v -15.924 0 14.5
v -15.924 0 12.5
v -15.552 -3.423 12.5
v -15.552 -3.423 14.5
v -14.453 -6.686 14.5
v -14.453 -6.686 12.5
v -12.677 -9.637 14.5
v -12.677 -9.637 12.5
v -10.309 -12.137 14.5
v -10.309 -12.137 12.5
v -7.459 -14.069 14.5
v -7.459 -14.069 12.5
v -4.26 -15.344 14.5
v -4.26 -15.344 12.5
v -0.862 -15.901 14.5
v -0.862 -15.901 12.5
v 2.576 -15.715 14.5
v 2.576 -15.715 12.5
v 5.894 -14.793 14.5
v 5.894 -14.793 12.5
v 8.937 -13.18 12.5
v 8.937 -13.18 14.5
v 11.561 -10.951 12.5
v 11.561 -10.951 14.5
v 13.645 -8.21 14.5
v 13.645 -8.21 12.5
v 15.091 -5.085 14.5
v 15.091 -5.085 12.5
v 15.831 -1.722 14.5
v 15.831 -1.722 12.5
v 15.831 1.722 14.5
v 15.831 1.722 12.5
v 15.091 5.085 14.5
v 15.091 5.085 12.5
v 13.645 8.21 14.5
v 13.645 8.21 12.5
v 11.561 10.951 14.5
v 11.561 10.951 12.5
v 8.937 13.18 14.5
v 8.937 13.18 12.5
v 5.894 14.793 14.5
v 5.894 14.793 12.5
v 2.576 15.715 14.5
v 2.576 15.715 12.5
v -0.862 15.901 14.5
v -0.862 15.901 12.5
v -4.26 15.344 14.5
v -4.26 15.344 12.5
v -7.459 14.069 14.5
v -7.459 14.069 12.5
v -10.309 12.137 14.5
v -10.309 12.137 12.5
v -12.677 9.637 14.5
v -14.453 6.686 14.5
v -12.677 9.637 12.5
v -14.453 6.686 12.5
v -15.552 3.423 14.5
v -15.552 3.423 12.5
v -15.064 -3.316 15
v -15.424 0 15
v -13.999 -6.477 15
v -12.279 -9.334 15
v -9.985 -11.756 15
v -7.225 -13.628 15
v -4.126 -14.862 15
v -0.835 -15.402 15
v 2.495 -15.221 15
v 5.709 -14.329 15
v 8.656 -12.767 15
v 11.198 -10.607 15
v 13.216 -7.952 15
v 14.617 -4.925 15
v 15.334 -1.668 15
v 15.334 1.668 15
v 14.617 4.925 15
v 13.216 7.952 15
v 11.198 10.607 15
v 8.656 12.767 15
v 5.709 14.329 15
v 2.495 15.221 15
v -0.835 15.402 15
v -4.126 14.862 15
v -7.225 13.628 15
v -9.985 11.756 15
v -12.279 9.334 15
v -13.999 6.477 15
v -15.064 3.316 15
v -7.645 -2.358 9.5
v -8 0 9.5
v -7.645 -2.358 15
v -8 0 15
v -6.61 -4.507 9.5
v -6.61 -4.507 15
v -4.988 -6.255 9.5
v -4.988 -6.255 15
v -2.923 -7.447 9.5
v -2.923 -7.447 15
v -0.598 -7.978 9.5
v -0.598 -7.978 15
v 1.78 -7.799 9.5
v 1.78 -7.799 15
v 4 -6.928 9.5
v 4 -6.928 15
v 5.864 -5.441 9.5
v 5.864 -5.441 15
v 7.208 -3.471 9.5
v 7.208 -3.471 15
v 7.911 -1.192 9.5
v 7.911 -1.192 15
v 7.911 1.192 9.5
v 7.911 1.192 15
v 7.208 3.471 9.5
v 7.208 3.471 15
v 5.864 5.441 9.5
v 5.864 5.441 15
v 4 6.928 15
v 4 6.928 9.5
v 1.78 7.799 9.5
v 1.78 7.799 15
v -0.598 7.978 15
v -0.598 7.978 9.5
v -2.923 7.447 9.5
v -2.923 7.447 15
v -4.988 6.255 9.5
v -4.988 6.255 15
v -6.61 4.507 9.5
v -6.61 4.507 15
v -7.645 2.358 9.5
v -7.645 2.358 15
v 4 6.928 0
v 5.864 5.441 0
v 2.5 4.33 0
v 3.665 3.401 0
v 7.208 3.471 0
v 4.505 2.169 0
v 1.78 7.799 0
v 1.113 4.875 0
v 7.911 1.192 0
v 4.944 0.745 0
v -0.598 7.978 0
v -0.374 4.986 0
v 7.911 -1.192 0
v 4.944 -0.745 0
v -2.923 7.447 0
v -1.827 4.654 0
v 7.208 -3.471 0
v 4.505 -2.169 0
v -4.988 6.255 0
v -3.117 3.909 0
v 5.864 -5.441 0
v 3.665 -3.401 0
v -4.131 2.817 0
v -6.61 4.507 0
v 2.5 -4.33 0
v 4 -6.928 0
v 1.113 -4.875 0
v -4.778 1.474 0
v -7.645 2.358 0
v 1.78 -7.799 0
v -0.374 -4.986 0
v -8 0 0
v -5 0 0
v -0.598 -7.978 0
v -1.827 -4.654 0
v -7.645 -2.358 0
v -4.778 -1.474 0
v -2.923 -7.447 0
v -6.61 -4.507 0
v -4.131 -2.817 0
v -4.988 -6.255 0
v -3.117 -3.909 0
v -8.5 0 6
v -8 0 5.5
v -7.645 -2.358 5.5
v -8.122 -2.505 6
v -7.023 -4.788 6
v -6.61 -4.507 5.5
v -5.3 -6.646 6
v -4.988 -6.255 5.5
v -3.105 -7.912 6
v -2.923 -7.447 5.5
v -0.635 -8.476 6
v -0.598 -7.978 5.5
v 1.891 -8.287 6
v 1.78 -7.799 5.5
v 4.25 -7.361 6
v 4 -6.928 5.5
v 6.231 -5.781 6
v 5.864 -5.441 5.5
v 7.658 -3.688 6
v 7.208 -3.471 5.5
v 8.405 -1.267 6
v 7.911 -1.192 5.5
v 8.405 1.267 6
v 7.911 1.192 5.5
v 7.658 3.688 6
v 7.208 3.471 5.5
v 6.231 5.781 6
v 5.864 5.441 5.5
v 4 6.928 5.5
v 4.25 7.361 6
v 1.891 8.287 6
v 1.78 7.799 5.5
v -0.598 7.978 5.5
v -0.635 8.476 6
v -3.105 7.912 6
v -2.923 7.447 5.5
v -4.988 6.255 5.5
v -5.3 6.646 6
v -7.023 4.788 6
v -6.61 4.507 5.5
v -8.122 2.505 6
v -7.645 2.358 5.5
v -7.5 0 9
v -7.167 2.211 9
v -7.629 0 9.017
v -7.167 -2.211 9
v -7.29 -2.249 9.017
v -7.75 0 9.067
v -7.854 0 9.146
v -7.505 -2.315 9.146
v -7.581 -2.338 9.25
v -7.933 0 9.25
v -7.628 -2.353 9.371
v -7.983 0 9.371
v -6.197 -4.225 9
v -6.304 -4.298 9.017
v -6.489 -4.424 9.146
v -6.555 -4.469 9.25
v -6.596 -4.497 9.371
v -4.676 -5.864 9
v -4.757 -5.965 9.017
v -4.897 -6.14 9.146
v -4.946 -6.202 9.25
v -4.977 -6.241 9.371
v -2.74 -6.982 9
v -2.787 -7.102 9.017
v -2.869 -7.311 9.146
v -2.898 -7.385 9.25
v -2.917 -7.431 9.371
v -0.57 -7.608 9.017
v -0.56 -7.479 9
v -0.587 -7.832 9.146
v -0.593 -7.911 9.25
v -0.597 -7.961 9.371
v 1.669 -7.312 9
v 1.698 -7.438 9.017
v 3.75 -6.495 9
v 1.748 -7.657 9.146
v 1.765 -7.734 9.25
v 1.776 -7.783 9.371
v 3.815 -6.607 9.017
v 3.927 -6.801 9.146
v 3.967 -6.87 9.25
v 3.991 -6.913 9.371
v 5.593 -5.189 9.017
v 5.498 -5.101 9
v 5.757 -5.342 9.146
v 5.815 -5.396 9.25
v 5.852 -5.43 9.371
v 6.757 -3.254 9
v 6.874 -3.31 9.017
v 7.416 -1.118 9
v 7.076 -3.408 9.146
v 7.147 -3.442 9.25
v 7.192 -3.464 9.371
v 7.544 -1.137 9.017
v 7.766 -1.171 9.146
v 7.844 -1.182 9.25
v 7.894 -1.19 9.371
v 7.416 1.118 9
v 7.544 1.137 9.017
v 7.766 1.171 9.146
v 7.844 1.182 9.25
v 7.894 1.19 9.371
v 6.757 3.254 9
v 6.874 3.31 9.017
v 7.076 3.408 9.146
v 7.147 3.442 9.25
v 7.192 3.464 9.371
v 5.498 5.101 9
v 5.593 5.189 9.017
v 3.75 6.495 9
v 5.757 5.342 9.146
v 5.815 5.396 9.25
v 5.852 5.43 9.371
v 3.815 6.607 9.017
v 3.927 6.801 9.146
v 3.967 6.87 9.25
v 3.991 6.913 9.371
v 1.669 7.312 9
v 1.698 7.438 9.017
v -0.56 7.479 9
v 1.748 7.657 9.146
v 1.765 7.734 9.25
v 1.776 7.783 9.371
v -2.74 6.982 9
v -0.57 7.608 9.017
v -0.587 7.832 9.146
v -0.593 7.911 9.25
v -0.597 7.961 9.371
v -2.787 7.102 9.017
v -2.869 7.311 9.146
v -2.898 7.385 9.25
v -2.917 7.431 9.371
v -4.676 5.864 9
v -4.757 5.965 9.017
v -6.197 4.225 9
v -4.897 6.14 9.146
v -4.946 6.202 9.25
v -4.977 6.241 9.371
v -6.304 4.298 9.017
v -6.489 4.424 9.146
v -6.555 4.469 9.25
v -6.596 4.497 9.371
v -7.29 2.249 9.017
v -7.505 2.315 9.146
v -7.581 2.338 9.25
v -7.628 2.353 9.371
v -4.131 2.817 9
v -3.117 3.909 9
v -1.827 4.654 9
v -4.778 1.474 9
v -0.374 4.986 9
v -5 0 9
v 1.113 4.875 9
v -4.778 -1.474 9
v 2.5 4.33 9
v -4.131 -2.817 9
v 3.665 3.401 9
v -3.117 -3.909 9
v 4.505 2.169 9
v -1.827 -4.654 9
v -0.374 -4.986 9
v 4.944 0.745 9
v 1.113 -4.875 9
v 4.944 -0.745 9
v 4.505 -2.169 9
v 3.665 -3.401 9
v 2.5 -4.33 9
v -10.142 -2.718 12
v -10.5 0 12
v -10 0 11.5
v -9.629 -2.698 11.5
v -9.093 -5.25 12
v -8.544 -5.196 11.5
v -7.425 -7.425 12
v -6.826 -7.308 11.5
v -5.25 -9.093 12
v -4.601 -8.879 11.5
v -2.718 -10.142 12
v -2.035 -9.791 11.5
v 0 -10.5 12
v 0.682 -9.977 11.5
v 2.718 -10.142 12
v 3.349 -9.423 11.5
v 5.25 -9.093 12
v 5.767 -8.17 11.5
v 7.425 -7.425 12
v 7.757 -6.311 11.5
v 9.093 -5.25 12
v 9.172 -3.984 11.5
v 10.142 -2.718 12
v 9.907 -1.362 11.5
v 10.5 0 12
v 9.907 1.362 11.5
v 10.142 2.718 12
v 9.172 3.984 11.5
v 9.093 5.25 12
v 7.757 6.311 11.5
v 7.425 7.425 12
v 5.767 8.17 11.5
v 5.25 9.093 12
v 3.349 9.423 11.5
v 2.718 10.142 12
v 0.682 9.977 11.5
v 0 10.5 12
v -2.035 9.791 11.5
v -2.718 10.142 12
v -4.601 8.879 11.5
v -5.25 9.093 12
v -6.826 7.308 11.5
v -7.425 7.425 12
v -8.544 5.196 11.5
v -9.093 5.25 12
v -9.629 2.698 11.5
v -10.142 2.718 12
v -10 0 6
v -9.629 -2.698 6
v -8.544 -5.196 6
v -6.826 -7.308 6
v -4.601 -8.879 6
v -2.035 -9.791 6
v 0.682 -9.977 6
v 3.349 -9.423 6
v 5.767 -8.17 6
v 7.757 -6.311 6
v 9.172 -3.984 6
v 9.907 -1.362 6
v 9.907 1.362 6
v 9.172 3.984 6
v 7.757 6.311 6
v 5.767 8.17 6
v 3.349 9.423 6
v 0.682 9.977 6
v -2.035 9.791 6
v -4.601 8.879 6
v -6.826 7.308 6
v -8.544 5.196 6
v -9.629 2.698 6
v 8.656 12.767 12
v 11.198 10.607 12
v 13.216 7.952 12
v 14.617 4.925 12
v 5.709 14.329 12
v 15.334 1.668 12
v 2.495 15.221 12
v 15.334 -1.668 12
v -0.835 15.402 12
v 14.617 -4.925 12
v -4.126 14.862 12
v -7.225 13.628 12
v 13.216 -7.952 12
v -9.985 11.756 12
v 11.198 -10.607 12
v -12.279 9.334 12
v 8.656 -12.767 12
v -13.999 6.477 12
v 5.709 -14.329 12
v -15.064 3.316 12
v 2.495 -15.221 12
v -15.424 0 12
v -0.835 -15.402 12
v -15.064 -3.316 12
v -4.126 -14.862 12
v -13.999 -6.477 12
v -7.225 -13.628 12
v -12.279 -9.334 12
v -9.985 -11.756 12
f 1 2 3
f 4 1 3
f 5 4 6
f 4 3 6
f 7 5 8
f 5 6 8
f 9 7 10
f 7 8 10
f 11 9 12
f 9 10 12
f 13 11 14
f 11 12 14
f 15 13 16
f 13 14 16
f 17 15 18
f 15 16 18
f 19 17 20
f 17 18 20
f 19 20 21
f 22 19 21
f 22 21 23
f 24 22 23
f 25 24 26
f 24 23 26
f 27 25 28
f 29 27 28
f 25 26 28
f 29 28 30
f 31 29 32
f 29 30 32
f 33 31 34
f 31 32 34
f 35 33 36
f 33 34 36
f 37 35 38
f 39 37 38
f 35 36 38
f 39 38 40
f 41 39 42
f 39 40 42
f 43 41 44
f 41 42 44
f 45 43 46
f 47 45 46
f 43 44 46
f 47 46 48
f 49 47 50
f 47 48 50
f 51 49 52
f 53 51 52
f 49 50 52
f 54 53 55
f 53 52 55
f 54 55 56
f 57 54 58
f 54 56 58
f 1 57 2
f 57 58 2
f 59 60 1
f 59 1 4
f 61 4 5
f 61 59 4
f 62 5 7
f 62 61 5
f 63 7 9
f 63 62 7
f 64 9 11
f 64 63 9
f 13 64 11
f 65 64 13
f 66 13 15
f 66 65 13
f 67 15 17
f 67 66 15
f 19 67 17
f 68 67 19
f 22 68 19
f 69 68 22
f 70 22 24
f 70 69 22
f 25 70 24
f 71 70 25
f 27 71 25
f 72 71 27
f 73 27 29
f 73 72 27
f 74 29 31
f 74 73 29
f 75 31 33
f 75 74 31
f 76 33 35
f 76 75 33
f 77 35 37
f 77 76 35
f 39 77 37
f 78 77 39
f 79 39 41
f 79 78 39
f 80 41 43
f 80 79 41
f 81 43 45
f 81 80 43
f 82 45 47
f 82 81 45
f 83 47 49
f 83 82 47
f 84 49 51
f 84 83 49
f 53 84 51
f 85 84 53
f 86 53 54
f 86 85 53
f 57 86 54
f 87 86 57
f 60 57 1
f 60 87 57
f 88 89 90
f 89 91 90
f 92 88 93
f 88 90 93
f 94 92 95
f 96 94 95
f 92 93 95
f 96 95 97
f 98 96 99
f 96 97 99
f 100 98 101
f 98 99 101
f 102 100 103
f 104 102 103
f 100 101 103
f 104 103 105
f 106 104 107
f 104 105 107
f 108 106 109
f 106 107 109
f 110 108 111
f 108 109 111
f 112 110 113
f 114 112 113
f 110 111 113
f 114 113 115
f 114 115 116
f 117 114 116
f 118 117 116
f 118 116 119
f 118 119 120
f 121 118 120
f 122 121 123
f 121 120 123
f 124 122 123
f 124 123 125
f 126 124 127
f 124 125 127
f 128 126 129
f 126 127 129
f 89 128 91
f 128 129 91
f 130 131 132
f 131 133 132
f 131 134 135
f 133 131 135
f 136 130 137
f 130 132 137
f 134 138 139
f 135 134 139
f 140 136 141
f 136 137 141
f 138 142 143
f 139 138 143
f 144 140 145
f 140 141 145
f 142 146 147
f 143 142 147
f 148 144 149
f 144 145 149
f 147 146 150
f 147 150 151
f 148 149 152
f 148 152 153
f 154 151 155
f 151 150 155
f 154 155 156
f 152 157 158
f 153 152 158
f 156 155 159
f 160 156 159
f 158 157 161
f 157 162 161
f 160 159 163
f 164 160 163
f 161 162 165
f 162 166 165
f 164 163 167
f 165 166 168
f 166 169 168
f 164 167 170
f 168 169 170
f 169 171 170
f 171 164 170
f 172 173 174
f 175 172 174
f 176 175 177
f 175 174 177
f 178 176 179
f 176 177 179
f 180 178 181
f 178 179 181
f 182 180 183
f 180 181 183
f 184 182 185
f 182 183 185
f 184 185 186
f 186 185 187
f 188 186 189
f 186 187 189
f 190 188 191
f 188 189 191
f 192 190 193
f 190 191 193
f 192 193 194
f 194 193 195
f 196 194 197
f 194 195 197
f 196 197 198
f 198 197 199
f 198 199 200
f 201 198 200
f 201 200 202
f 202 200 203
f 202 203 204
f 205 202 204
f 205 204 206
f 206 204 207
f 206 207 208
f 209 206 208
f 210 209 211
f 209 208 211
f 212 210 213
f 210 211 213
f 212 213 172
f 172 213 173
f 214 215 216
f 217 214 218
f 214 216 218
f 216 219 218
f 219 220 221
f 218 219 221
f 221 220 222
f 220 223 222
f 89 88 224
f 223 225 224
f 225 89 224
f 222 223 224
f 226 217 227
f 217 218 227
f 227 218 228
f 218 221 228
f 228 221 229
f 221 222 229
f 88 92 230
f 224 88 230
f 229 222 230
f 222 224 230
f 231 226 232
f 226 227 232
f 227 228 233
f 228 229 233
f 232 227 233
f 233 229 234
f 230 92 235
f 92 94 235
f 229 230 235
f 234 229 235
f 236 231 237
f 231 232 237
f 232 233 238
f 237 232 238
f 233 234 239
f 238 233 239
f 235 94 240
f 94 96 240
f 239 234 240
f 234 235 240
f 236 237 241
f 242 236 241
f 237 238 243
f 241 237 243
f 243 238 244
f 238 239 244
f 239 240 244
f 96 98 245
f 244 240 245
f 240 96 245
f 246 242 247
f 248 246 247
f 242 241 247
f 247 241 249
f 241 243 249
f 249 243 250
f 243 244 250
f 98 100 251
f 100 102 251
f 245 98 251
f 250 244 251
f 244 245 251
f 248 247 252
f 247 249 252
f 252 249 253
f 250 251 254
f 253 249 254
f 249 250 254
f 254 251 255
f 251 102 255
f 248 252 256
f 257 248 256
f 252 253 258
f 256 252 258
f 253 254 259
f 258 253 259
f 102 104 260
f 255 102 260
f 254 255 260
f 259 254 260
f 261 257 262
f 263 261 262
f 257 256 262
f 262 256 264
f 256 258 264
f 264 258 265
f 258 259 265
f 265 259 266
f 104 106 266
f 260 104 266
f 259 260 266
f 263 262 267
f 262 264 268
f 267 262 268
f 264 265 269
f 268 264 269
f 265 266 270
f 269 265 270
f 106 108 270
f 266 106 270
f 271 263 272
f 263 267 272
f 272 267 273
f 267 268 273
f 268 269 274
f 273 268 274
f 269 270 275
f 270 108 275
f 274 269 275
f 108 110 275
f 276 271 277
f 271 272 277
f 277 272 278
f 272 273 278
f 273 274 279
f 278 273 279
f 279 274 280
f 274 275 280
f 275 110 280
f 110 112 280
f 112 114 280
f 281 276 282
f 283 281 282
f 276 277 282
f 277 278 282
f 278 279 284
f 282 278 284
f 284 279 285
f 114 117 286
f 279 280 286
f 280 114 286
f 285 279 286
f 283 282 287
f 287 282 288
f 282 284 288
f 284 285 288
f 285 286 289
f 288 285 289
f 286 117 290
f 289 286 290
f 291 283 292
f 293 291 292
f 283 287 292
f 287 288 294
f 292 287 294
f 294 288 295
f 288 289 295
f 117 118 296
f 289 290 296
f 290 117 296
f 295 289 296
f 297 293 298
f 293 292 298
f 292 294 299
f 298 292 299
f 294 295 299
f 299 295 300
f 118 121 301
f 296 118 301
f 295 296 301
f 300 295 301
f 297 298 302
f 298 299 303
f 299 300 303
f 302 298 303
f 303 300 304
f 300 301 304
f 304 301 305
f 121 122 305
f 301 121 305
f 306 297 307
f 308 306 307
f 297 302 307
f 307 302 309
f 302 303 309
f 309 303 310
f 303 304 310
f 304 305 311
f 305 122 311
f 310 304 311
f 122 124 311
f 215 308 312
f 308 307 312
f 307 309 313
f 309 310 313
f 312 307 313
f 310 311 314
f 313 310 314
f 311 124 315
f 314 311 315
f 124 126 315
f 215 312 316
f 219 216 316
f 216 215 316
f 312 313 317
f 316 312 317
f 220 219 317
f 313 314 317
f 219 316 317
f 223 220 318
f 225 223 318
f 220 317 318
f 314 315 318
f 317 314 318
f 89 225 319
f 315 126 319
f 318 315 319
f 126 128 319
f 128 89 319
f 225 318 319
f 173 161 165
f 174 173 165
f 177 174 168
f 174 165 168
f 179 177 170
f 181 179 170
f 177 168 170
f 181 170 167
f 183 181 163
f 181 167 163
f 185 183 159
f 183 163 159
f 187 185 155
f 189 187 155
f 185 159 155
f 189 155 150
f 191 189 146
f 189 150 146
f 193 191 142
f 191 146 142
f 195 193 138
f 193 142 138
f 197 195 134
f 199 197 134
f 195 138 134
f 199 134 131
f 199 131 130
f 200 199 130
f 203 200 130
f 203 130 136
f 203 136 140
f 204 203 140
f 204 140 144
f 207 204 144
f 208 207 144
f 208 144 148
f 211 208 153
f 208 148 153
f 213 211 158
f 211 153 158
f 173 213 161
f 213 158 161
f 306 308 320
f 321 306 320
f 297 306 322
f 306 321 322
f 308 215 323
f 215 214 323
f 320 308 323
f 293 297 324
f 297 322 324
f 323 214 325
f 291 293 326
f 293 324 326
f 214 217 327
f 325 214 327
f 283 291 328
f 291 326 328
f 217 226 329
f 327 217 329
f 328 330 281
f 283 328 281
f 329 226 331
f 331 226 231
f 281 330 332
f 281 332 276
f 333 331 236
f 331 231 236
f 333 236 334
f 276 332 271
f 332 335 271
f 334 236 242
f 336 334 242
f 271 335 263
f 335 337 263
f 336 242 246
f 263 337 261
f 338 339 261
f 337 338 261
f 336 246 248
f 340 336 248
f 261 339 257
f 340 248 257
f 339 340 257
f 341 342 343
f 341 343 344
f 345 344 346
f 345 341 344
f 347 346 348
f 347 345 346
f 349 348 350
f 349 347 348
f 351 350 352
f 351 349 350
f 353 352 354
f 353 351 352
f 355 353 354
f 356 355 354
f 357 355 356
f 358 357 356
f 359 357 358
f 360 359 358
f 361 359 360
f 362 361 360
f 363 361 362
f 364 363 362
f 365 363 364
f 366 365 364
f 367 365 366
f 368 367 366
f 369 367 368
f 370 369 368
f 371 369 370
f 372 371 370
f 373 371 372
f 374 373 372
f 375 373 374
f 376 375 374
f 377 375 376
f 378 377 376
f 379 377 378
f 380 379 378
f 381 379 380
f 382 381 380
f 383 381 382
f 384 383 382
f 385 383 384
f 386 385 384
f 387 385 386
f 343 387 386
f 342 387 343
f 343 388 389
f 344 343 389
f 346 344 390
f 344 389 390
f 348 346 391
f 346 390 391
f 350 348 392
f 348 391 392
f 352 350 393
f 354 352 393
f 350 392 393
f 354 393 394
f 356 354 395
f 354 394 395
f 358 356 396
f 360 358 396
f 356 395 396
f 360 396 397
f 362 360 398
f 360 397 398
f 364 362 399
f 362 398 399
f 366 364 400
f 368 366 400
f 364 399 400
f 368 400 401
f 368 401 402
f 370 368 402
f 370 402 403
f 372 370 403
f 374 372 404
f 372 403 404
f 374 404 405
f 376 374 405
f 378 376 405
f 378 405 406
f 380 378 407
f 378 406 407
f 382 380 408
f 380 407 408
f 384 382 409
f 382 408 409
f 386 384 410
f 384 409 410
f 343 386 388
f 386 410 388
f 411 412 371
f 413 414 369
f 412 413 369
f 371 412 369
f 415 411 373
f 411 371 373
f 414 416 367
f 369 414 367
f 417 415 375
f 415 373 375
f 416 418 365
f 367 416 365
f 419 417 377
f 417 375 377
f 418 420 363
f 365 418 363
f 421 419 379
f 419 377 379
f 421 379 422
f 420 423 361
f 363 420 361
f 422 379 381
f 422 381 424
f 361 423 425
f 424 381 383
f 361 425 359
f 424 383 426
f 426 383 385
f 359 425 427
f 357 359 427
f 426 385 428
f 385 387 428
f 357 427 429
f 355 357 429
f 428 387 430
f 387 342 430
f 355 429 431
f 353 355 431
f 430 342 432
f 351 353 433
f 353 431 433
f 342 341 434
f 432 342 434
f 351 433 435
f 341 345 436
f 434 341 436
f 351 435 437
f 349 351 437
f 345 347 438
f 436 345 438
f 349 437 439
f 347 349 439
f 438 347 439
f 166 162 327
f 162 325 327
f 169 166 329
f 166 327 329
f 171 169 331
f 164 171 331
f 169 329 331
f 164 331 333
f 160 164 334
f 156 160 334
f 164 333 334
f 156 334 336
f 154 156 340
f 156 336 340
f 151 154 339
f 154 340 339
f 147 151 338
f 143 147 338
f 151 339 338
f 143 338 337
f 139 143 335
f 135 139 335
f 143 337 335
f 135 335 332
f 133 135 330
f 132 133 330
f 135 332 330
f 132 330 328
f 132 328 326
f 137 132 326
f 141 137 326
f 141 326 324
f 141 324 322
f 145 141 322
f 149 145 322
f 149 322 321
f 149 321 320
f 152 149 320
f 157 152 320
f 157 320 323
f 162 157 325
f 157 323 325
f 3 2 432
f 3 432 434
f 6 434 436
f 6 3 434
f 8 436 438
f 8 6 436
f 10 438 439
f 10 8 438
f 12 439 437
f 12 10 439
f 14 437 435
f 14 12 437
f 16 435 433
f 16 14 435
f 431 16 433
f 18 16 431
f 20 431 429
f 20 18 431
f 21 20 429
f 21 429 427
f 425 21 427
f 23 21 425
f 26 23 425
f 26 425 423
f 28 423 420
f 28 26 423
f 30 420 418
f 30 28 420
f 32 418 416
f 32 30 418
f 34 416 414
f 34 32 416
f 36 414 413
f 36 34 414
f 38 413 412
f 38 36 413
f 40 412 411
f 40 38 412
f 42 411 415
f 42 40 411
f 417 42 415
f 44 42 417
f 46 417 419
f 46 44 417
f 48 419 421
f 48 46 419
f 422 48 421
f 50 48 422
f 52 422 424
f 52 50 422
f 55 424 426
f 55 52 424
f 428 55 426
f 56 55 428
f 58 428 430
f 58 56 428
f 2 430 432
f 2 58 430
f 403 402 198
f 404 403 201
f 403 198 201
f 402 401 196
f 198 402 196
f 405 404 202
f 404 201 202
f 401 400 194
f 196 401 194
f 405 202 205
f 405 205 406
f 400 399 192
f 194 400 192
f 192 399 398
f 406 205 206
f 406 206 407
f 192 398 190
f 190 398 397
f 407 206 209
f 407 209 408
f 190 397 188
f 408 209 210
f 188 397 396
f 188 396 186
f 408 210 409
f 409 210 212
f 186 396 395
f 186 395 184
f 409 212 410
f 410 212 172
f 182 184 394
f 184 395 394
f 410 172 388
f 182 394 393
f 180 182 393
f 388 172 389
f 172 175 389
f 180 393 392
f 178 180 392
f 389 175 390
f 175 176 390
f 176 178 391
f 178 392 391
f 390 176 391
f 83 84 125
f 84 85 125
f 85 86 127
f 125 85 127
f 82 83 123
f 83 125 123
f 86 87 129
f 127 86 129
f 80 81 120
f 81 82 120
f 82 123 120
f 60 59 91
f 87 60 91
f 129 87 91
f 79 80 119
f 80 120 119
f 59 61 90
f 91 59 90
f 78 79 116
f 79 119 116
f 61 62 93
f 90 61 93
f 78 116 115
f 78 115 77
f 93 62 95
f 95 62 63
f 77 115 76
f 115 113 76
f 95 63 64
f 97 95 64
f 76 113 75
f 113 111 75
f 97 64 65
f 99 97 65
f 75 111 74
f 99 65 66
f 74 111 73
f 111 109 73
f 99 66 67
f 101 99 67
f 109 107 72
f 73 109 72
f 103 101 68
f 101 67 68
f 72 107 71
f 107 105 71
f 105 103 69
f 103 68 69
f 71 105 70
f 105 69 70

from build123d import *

# Parameters (mm, degrees)
F2_SIZE = 0.5
F3_SIZE = 0.5


with BuildPart() as f1:
    # F0 (on Front) → F1 (revolve)
    with BuildSketch(Plane.XZ):
        with BuildLine():
            Line((-15.92432, 12), (-10, 12))
            Line((-10, 12), (-10, 6))
            Line((-10, 6), (-8, 6))
            Line((-8, 6), (-8, 0))
            Line((-8, 0), (-5, 0))
            Line((-5, 0), (-5, 9))
            Line((-5, 9), (-7.5, 9))
            ThreePointArc((-7.5, 9), (-7.853553, 9.146447), (-8, 9.5))
            Line((-8, 9.5), (-8, 15))
            Line((-8, 15), (-15.92432, 15))
            Line((-15.92432, 15), (-15.92432, 12))
        make_face()
    revolve(axis=Axis((0, 0, 8.069702), (0, 0, 1)))

    # F2
    f2_edges = [f1.edges().sort_by_distance(p)[0] for p in [
        (8, 0, 6),
    ]]
    chamfer(f2_edges, length=F2_SIZE)

    # F3
    f3_edges = [f1.edges().sort_by_distance(p)[0] for p in [
        (15.92432, 0, 12),
        (15.92432, 0, 15),
        (10, 0, 12),
    ]]
    chamfer(f3_edges, length=F3_SIZE)


solid = f1.part
